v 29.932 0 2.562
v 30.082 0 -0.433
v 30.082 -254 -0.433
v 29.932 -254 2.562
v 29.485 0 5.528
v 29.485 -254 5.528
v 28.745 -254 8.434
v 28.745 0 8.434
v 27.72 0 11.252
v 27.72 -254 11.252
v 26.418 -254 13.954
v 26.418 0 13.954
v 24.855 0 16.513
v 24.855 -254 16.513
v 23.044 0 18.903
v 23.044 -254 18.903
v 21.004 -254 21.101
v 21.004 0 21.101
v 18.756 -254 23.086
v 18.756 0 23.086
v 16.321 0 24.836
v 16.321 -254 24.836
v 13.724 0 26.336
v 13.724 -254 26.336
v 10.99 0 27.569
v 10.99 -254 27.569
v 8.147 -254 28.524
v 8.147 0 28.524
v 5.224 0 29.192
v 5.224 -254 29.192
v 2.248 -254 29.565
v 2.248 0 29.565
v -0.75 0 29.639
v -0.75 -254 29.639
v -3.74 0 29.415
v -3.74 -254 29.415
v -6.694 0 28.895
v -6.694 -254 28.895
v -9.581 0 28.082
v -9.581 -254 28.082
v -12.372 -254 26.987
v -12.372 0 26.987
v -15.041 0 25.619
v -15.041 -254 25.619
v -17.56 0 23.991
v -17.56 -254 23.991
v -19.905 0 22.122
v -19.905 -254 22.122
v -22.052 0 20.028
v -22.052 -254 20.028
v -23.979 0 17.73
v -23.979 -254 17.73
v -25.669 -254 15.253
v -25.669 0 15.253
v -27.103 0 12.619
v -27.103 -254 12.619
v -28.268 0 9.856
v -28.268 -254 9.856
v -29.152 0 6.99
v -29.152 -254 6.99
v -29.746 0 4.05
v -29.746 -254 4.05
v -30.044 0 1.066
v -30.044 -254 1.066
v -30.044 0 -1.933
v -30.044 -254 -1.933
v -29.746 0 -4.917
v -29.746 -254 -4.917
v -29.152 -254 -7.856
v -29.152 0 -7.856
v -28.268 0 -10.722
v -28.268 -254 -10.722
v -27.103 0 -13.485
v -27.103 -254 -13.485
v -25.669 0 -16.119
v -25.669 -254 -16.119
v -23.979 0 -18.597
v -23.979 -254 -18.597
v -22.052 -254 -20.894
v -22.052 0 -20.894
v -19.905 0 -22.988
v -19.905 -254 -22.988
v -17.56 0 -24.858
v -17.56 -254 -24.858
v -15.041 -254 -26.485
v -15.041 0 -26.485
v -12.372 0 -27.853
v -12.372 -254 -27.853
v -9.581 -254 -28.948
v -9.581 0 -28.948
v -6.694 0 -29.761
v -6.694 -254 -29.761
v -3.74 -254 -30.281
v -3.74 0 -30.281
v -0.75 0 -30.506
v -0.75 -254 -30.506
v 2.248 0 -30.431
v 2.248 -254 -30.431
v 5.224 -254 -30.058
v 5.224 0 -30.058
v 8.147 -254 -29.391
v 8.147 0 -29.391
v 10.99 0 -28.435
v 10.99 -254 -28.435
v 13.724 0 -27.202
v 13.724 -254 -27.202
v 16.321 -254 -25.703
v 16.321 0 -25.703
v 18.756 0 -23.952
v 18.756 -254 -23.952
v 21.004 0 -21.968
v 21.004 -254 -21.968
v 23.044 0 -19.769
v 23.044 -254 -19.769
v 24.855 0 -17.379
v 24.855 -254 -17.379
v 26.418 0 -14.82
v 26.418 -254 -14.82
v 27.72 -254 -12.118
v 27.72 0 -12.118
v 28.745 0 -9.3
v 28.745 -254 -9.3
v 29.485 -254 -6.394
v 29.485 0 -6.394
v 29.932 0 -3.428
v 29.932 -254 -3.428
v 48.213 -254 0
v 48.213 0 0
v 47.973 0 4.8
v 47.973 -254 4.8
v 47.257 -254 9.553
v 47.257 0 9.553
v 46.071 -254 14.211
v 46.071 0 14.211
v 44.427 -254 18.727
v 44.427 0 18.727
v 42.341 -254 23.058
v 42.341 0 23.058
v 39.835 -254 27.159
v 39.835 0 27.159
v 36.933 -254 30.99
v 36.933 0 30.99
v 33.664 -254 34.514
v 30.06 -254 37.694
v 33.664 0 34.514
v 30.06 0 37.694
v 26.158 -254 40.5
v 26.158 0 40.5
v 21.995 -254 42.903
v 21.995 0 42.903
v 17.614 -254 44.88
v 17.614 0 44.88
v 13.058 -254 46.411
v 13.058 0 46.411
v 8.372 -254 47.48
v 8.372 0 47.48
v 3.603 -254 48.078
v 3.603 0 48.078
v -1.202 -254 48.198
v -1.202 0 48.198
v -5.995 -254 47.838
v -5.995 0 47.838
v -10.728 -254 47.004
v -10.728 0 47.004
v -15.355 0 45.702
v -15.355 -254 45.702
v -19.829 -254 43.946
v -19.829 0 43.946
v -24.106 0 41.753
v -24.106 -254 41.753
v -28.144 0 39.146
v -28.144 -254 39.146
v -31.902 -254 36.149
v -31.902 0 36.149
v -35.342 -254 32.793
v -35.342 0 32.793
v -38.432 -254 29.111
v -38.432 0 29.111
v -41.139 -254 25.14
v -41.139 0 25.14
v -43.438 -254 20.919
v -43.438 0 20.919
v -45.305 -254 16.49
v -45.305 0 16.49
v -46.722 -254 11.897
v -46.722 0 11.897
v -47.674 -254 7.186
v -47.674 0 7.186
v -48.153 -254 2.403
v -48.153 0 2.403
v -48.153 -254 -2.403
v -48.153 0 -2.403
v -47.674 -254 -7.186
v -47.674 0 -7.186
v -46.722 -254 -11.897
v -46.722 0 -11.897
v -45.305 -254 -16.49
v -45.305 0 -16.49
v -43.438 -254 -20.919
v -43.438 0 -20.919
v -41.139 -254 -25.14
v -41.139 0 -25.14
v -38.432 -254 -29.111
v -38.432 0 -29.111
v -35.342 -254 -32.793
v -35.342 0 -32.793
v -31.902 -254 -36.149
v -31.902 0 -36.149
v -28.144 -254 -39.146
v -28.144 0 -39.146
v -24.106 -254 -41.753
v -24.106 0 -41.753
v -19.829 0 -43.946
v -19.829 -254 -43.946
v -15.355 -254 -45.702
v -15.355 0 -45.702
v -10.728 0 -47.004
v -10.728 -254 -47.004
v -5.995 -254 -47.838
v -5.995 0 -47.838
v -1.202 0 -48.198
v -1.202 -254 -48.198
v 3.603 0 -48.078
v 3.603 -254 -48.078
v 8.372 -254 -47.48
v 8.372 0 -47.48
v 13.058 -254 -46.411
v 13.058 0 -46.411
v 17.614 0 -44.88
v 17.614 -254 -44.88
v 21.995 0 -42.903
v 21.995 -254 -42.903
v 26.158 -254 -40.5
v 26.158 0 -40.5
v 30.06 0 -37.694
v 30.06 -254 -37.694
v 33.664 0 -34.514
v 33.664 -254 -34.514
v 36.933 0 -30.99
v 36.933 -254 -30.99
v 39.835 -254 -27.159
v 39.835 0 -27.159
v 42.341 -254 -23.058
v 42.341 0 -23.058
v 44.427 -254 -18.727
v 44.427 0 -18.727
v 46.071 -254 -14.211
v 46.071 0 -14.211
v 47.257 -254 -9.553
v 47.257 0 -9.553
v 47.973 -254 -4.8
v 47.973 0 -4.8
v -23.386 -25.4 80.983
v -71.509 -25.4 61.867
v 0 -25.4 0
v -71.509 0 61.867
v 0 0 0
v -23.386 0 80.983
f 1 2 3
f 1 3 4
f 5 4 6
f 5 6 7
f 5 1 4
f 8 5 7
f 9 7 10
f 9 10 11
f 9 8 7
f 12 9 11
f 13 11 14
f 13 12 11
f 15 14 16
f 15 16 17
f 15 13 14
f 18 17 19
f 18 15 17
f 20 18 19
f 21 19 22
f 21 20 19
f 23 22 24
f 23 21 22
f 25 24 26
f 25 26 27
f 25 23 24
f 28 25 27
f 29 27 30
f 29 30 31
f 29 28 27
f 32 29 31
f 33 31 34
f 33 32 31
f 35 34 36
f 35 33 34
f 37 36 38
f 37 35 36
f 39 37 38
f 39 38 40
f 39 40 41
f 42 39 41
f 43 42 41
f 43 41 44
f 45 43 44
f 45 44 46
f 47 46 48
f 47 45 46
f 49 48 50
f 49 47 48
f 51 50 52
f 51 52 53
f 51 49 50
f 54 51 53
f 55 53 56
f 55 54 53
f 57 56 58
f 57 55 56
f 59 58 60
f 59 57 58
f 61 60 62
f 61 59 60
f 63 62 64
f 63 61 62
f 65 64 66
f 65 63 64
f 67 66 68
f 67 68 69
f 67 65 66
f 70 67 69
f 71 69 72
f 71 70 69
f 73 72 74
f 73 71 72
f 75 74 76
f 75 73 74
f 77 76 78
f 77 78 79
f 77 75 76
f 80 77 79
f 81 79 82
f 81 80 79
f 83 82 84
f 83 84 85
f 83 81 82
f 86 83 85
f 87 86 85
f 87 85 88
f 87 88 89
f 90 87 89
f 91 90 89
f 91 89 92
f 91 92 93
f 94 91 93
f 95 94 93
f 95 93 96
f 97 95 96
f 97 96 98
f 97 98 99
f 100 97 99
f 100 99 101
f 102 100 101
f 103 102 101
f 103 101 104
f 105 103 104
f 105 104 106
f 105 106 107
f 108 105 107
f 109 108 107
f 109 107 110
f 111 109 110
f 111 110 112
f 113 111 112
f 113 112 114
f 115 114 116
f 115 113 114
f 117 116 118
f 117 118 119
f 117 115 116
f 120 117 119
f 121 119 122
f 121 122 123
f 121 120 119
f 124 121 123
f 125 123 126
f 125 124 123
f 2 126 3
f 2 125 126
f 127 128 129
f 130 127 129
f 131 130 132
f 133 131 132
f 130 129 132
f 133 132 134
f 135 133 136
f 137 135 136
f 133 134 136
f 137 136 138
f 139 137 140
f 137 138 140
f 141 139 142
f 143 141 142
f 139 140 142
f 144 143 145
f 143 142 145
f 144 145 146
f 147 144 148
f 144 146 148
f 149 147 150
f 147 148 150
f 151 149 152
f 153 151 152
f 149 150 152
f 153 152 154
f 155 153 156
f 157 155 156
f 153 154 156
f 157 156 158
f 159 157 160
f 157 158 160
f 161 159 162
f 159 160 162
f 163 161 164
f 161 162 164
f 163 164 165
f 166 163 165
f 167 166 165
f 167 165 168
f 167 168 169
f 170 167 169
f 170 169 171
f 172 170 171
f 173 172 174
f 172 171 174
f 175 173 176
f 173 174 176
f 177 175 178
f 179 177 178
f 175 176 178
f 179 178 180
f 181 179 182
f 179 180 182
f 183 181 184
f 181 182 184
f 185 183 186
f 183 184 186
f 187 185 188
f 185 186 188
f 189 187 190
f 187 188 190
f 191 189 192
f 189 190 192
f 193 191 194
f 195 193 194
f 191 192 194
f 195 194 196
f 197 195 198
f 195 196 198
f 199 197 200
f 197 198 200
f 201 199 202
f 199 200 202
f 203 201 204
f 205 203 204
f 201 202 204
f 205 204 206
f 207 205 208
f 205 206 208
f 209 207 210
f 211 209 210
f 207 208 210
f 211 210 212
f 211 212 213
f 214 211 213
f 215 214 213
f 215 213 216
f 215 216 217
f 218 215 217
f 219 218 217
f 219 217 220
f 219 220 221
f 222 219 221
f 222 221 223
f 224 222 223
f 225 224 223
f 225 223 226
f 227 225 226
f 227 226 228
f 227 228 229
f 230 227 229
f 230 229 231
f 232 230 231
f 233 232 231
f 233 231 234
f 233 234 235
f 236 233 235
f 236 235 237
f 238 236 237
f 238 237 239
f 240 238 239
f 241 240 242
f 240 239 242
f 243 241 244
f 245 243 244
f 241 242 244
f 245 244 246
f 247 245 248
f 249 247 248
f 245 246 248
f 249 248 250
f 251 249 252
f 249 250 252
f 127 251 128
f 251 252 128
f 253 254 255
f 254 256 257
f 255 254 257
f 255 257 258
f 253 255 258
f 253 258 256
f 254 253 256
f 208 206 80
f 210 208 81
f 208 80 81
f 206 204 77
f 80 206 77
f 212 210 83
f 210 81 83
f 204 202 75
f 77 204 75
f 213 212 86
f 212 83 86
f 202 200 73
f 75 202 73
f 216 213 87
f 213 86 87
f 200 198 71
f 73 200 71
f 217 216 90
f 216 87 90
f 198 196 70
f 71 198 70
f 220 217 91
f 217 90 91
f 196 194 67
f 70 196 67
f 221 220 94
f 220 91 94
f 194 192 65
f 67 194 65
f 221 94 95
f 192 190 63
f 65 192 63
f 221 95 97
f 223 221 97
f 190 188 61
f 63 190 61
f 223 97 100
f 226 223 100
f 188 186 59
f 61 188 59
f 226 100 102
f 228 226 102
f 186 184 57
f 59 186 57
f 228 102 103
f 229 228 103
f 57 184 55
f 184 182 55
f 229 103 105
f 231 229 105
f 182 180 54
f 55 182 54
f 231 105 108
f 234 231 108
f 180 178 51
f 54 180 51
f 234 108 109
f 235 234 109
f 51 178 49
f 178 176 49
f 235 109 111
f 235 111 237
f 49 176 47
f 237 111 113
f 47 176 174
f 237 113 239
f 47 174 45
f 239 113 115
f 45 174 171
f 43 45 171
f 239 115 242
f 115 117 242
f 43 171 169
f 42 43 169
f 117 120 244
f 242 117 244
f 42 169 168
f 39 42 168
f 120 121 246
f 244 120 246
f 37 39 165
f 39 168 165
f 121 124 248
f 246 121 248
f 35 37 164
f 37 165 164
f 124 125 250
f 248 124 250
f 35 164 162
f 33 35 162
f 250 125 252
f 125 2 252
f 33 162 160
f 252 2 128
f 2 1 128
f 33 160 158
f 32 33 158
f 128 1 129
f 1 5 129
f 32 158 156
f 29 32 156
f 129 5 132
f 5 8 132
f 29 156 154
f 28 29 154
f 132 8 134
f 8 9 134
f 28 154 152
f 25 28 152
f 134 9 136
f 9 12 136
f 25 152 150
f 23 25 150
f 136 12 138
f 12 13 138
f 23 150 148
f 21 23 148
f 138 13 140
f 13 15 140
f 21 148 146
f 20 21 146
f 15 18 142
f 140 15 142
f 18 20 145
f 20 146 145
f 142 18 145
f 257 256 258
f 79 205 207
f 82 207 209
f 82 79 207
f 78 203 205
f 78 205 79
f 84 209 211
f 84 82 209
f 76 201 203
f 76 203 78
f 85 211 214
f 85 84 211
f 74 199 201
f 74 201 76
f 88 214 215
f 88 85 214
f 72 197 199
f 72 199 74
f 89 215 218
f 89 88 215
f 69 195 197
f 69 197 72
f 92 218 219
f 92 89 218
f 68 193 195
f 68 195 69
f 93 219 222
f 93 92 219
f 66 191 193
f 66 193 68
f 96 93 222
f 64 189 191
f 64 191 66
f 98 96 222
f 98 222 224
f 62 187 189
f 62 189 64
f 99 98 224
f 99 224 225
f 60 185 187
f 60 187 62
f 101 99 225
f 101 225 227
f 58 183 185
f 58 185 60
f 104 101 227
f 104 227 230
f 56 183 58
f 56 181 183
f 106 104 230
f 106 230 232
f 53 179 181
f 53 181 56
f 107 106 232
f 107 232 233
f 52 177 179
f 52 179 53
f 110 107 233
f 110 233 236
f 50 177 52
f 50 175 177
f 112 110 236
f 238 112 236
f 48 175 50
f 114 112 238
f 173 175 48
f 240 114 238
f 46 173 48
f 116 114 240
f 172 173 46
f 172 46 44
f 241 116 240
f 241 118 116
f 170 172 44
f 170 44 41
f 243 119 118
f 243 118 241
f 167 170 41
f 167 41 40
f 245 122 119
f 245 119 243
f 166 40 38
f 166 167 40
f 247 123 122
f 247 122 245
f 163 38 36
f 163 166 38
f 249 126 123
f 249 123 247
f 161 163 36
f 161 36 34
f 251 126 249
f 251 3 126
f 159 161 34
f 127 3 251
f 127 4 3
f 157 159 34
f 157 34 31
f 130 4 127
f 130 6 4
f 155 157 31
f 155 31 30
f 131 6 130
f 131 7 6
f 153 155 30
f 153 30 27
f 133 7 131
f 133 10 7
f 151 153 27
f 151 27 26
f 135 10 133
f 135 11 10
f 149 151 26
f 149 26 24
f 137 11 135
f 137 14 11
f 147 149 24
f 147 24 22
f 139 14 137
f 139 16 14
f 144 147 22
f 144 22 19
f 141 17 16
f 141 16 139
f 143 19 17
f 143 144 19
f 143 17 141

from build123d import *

# Parameters (mm, degrees)
F1_DEPTH = 25.4
F2_R     = 48.212619
F2_R_2   = 30.081793
F3_DEPTH = 254


with BuildPart() as f1:
    # F0 (on Front) → F1 (new body)
    with BuildSketch(Plane.XZ):
        Polygon((-23.385614, 80.983482), (-71.508929, 61.867438), (0, 0), align=None)
    extrude(amount=F1_DEPTH)


with BuildPart() as f3:
    # F2 (on Front) → F3 (new body)
    with BuildSketch(Plane.XZ):
        Circle(F2_R)
        with Locations((0, -0.433072)):
            Circle(F2_R_2, mode=Mode.SUBTRACT)
    extrude(amount=F3_DEPTH)


solid = Compound([f1.part, f3.part])
